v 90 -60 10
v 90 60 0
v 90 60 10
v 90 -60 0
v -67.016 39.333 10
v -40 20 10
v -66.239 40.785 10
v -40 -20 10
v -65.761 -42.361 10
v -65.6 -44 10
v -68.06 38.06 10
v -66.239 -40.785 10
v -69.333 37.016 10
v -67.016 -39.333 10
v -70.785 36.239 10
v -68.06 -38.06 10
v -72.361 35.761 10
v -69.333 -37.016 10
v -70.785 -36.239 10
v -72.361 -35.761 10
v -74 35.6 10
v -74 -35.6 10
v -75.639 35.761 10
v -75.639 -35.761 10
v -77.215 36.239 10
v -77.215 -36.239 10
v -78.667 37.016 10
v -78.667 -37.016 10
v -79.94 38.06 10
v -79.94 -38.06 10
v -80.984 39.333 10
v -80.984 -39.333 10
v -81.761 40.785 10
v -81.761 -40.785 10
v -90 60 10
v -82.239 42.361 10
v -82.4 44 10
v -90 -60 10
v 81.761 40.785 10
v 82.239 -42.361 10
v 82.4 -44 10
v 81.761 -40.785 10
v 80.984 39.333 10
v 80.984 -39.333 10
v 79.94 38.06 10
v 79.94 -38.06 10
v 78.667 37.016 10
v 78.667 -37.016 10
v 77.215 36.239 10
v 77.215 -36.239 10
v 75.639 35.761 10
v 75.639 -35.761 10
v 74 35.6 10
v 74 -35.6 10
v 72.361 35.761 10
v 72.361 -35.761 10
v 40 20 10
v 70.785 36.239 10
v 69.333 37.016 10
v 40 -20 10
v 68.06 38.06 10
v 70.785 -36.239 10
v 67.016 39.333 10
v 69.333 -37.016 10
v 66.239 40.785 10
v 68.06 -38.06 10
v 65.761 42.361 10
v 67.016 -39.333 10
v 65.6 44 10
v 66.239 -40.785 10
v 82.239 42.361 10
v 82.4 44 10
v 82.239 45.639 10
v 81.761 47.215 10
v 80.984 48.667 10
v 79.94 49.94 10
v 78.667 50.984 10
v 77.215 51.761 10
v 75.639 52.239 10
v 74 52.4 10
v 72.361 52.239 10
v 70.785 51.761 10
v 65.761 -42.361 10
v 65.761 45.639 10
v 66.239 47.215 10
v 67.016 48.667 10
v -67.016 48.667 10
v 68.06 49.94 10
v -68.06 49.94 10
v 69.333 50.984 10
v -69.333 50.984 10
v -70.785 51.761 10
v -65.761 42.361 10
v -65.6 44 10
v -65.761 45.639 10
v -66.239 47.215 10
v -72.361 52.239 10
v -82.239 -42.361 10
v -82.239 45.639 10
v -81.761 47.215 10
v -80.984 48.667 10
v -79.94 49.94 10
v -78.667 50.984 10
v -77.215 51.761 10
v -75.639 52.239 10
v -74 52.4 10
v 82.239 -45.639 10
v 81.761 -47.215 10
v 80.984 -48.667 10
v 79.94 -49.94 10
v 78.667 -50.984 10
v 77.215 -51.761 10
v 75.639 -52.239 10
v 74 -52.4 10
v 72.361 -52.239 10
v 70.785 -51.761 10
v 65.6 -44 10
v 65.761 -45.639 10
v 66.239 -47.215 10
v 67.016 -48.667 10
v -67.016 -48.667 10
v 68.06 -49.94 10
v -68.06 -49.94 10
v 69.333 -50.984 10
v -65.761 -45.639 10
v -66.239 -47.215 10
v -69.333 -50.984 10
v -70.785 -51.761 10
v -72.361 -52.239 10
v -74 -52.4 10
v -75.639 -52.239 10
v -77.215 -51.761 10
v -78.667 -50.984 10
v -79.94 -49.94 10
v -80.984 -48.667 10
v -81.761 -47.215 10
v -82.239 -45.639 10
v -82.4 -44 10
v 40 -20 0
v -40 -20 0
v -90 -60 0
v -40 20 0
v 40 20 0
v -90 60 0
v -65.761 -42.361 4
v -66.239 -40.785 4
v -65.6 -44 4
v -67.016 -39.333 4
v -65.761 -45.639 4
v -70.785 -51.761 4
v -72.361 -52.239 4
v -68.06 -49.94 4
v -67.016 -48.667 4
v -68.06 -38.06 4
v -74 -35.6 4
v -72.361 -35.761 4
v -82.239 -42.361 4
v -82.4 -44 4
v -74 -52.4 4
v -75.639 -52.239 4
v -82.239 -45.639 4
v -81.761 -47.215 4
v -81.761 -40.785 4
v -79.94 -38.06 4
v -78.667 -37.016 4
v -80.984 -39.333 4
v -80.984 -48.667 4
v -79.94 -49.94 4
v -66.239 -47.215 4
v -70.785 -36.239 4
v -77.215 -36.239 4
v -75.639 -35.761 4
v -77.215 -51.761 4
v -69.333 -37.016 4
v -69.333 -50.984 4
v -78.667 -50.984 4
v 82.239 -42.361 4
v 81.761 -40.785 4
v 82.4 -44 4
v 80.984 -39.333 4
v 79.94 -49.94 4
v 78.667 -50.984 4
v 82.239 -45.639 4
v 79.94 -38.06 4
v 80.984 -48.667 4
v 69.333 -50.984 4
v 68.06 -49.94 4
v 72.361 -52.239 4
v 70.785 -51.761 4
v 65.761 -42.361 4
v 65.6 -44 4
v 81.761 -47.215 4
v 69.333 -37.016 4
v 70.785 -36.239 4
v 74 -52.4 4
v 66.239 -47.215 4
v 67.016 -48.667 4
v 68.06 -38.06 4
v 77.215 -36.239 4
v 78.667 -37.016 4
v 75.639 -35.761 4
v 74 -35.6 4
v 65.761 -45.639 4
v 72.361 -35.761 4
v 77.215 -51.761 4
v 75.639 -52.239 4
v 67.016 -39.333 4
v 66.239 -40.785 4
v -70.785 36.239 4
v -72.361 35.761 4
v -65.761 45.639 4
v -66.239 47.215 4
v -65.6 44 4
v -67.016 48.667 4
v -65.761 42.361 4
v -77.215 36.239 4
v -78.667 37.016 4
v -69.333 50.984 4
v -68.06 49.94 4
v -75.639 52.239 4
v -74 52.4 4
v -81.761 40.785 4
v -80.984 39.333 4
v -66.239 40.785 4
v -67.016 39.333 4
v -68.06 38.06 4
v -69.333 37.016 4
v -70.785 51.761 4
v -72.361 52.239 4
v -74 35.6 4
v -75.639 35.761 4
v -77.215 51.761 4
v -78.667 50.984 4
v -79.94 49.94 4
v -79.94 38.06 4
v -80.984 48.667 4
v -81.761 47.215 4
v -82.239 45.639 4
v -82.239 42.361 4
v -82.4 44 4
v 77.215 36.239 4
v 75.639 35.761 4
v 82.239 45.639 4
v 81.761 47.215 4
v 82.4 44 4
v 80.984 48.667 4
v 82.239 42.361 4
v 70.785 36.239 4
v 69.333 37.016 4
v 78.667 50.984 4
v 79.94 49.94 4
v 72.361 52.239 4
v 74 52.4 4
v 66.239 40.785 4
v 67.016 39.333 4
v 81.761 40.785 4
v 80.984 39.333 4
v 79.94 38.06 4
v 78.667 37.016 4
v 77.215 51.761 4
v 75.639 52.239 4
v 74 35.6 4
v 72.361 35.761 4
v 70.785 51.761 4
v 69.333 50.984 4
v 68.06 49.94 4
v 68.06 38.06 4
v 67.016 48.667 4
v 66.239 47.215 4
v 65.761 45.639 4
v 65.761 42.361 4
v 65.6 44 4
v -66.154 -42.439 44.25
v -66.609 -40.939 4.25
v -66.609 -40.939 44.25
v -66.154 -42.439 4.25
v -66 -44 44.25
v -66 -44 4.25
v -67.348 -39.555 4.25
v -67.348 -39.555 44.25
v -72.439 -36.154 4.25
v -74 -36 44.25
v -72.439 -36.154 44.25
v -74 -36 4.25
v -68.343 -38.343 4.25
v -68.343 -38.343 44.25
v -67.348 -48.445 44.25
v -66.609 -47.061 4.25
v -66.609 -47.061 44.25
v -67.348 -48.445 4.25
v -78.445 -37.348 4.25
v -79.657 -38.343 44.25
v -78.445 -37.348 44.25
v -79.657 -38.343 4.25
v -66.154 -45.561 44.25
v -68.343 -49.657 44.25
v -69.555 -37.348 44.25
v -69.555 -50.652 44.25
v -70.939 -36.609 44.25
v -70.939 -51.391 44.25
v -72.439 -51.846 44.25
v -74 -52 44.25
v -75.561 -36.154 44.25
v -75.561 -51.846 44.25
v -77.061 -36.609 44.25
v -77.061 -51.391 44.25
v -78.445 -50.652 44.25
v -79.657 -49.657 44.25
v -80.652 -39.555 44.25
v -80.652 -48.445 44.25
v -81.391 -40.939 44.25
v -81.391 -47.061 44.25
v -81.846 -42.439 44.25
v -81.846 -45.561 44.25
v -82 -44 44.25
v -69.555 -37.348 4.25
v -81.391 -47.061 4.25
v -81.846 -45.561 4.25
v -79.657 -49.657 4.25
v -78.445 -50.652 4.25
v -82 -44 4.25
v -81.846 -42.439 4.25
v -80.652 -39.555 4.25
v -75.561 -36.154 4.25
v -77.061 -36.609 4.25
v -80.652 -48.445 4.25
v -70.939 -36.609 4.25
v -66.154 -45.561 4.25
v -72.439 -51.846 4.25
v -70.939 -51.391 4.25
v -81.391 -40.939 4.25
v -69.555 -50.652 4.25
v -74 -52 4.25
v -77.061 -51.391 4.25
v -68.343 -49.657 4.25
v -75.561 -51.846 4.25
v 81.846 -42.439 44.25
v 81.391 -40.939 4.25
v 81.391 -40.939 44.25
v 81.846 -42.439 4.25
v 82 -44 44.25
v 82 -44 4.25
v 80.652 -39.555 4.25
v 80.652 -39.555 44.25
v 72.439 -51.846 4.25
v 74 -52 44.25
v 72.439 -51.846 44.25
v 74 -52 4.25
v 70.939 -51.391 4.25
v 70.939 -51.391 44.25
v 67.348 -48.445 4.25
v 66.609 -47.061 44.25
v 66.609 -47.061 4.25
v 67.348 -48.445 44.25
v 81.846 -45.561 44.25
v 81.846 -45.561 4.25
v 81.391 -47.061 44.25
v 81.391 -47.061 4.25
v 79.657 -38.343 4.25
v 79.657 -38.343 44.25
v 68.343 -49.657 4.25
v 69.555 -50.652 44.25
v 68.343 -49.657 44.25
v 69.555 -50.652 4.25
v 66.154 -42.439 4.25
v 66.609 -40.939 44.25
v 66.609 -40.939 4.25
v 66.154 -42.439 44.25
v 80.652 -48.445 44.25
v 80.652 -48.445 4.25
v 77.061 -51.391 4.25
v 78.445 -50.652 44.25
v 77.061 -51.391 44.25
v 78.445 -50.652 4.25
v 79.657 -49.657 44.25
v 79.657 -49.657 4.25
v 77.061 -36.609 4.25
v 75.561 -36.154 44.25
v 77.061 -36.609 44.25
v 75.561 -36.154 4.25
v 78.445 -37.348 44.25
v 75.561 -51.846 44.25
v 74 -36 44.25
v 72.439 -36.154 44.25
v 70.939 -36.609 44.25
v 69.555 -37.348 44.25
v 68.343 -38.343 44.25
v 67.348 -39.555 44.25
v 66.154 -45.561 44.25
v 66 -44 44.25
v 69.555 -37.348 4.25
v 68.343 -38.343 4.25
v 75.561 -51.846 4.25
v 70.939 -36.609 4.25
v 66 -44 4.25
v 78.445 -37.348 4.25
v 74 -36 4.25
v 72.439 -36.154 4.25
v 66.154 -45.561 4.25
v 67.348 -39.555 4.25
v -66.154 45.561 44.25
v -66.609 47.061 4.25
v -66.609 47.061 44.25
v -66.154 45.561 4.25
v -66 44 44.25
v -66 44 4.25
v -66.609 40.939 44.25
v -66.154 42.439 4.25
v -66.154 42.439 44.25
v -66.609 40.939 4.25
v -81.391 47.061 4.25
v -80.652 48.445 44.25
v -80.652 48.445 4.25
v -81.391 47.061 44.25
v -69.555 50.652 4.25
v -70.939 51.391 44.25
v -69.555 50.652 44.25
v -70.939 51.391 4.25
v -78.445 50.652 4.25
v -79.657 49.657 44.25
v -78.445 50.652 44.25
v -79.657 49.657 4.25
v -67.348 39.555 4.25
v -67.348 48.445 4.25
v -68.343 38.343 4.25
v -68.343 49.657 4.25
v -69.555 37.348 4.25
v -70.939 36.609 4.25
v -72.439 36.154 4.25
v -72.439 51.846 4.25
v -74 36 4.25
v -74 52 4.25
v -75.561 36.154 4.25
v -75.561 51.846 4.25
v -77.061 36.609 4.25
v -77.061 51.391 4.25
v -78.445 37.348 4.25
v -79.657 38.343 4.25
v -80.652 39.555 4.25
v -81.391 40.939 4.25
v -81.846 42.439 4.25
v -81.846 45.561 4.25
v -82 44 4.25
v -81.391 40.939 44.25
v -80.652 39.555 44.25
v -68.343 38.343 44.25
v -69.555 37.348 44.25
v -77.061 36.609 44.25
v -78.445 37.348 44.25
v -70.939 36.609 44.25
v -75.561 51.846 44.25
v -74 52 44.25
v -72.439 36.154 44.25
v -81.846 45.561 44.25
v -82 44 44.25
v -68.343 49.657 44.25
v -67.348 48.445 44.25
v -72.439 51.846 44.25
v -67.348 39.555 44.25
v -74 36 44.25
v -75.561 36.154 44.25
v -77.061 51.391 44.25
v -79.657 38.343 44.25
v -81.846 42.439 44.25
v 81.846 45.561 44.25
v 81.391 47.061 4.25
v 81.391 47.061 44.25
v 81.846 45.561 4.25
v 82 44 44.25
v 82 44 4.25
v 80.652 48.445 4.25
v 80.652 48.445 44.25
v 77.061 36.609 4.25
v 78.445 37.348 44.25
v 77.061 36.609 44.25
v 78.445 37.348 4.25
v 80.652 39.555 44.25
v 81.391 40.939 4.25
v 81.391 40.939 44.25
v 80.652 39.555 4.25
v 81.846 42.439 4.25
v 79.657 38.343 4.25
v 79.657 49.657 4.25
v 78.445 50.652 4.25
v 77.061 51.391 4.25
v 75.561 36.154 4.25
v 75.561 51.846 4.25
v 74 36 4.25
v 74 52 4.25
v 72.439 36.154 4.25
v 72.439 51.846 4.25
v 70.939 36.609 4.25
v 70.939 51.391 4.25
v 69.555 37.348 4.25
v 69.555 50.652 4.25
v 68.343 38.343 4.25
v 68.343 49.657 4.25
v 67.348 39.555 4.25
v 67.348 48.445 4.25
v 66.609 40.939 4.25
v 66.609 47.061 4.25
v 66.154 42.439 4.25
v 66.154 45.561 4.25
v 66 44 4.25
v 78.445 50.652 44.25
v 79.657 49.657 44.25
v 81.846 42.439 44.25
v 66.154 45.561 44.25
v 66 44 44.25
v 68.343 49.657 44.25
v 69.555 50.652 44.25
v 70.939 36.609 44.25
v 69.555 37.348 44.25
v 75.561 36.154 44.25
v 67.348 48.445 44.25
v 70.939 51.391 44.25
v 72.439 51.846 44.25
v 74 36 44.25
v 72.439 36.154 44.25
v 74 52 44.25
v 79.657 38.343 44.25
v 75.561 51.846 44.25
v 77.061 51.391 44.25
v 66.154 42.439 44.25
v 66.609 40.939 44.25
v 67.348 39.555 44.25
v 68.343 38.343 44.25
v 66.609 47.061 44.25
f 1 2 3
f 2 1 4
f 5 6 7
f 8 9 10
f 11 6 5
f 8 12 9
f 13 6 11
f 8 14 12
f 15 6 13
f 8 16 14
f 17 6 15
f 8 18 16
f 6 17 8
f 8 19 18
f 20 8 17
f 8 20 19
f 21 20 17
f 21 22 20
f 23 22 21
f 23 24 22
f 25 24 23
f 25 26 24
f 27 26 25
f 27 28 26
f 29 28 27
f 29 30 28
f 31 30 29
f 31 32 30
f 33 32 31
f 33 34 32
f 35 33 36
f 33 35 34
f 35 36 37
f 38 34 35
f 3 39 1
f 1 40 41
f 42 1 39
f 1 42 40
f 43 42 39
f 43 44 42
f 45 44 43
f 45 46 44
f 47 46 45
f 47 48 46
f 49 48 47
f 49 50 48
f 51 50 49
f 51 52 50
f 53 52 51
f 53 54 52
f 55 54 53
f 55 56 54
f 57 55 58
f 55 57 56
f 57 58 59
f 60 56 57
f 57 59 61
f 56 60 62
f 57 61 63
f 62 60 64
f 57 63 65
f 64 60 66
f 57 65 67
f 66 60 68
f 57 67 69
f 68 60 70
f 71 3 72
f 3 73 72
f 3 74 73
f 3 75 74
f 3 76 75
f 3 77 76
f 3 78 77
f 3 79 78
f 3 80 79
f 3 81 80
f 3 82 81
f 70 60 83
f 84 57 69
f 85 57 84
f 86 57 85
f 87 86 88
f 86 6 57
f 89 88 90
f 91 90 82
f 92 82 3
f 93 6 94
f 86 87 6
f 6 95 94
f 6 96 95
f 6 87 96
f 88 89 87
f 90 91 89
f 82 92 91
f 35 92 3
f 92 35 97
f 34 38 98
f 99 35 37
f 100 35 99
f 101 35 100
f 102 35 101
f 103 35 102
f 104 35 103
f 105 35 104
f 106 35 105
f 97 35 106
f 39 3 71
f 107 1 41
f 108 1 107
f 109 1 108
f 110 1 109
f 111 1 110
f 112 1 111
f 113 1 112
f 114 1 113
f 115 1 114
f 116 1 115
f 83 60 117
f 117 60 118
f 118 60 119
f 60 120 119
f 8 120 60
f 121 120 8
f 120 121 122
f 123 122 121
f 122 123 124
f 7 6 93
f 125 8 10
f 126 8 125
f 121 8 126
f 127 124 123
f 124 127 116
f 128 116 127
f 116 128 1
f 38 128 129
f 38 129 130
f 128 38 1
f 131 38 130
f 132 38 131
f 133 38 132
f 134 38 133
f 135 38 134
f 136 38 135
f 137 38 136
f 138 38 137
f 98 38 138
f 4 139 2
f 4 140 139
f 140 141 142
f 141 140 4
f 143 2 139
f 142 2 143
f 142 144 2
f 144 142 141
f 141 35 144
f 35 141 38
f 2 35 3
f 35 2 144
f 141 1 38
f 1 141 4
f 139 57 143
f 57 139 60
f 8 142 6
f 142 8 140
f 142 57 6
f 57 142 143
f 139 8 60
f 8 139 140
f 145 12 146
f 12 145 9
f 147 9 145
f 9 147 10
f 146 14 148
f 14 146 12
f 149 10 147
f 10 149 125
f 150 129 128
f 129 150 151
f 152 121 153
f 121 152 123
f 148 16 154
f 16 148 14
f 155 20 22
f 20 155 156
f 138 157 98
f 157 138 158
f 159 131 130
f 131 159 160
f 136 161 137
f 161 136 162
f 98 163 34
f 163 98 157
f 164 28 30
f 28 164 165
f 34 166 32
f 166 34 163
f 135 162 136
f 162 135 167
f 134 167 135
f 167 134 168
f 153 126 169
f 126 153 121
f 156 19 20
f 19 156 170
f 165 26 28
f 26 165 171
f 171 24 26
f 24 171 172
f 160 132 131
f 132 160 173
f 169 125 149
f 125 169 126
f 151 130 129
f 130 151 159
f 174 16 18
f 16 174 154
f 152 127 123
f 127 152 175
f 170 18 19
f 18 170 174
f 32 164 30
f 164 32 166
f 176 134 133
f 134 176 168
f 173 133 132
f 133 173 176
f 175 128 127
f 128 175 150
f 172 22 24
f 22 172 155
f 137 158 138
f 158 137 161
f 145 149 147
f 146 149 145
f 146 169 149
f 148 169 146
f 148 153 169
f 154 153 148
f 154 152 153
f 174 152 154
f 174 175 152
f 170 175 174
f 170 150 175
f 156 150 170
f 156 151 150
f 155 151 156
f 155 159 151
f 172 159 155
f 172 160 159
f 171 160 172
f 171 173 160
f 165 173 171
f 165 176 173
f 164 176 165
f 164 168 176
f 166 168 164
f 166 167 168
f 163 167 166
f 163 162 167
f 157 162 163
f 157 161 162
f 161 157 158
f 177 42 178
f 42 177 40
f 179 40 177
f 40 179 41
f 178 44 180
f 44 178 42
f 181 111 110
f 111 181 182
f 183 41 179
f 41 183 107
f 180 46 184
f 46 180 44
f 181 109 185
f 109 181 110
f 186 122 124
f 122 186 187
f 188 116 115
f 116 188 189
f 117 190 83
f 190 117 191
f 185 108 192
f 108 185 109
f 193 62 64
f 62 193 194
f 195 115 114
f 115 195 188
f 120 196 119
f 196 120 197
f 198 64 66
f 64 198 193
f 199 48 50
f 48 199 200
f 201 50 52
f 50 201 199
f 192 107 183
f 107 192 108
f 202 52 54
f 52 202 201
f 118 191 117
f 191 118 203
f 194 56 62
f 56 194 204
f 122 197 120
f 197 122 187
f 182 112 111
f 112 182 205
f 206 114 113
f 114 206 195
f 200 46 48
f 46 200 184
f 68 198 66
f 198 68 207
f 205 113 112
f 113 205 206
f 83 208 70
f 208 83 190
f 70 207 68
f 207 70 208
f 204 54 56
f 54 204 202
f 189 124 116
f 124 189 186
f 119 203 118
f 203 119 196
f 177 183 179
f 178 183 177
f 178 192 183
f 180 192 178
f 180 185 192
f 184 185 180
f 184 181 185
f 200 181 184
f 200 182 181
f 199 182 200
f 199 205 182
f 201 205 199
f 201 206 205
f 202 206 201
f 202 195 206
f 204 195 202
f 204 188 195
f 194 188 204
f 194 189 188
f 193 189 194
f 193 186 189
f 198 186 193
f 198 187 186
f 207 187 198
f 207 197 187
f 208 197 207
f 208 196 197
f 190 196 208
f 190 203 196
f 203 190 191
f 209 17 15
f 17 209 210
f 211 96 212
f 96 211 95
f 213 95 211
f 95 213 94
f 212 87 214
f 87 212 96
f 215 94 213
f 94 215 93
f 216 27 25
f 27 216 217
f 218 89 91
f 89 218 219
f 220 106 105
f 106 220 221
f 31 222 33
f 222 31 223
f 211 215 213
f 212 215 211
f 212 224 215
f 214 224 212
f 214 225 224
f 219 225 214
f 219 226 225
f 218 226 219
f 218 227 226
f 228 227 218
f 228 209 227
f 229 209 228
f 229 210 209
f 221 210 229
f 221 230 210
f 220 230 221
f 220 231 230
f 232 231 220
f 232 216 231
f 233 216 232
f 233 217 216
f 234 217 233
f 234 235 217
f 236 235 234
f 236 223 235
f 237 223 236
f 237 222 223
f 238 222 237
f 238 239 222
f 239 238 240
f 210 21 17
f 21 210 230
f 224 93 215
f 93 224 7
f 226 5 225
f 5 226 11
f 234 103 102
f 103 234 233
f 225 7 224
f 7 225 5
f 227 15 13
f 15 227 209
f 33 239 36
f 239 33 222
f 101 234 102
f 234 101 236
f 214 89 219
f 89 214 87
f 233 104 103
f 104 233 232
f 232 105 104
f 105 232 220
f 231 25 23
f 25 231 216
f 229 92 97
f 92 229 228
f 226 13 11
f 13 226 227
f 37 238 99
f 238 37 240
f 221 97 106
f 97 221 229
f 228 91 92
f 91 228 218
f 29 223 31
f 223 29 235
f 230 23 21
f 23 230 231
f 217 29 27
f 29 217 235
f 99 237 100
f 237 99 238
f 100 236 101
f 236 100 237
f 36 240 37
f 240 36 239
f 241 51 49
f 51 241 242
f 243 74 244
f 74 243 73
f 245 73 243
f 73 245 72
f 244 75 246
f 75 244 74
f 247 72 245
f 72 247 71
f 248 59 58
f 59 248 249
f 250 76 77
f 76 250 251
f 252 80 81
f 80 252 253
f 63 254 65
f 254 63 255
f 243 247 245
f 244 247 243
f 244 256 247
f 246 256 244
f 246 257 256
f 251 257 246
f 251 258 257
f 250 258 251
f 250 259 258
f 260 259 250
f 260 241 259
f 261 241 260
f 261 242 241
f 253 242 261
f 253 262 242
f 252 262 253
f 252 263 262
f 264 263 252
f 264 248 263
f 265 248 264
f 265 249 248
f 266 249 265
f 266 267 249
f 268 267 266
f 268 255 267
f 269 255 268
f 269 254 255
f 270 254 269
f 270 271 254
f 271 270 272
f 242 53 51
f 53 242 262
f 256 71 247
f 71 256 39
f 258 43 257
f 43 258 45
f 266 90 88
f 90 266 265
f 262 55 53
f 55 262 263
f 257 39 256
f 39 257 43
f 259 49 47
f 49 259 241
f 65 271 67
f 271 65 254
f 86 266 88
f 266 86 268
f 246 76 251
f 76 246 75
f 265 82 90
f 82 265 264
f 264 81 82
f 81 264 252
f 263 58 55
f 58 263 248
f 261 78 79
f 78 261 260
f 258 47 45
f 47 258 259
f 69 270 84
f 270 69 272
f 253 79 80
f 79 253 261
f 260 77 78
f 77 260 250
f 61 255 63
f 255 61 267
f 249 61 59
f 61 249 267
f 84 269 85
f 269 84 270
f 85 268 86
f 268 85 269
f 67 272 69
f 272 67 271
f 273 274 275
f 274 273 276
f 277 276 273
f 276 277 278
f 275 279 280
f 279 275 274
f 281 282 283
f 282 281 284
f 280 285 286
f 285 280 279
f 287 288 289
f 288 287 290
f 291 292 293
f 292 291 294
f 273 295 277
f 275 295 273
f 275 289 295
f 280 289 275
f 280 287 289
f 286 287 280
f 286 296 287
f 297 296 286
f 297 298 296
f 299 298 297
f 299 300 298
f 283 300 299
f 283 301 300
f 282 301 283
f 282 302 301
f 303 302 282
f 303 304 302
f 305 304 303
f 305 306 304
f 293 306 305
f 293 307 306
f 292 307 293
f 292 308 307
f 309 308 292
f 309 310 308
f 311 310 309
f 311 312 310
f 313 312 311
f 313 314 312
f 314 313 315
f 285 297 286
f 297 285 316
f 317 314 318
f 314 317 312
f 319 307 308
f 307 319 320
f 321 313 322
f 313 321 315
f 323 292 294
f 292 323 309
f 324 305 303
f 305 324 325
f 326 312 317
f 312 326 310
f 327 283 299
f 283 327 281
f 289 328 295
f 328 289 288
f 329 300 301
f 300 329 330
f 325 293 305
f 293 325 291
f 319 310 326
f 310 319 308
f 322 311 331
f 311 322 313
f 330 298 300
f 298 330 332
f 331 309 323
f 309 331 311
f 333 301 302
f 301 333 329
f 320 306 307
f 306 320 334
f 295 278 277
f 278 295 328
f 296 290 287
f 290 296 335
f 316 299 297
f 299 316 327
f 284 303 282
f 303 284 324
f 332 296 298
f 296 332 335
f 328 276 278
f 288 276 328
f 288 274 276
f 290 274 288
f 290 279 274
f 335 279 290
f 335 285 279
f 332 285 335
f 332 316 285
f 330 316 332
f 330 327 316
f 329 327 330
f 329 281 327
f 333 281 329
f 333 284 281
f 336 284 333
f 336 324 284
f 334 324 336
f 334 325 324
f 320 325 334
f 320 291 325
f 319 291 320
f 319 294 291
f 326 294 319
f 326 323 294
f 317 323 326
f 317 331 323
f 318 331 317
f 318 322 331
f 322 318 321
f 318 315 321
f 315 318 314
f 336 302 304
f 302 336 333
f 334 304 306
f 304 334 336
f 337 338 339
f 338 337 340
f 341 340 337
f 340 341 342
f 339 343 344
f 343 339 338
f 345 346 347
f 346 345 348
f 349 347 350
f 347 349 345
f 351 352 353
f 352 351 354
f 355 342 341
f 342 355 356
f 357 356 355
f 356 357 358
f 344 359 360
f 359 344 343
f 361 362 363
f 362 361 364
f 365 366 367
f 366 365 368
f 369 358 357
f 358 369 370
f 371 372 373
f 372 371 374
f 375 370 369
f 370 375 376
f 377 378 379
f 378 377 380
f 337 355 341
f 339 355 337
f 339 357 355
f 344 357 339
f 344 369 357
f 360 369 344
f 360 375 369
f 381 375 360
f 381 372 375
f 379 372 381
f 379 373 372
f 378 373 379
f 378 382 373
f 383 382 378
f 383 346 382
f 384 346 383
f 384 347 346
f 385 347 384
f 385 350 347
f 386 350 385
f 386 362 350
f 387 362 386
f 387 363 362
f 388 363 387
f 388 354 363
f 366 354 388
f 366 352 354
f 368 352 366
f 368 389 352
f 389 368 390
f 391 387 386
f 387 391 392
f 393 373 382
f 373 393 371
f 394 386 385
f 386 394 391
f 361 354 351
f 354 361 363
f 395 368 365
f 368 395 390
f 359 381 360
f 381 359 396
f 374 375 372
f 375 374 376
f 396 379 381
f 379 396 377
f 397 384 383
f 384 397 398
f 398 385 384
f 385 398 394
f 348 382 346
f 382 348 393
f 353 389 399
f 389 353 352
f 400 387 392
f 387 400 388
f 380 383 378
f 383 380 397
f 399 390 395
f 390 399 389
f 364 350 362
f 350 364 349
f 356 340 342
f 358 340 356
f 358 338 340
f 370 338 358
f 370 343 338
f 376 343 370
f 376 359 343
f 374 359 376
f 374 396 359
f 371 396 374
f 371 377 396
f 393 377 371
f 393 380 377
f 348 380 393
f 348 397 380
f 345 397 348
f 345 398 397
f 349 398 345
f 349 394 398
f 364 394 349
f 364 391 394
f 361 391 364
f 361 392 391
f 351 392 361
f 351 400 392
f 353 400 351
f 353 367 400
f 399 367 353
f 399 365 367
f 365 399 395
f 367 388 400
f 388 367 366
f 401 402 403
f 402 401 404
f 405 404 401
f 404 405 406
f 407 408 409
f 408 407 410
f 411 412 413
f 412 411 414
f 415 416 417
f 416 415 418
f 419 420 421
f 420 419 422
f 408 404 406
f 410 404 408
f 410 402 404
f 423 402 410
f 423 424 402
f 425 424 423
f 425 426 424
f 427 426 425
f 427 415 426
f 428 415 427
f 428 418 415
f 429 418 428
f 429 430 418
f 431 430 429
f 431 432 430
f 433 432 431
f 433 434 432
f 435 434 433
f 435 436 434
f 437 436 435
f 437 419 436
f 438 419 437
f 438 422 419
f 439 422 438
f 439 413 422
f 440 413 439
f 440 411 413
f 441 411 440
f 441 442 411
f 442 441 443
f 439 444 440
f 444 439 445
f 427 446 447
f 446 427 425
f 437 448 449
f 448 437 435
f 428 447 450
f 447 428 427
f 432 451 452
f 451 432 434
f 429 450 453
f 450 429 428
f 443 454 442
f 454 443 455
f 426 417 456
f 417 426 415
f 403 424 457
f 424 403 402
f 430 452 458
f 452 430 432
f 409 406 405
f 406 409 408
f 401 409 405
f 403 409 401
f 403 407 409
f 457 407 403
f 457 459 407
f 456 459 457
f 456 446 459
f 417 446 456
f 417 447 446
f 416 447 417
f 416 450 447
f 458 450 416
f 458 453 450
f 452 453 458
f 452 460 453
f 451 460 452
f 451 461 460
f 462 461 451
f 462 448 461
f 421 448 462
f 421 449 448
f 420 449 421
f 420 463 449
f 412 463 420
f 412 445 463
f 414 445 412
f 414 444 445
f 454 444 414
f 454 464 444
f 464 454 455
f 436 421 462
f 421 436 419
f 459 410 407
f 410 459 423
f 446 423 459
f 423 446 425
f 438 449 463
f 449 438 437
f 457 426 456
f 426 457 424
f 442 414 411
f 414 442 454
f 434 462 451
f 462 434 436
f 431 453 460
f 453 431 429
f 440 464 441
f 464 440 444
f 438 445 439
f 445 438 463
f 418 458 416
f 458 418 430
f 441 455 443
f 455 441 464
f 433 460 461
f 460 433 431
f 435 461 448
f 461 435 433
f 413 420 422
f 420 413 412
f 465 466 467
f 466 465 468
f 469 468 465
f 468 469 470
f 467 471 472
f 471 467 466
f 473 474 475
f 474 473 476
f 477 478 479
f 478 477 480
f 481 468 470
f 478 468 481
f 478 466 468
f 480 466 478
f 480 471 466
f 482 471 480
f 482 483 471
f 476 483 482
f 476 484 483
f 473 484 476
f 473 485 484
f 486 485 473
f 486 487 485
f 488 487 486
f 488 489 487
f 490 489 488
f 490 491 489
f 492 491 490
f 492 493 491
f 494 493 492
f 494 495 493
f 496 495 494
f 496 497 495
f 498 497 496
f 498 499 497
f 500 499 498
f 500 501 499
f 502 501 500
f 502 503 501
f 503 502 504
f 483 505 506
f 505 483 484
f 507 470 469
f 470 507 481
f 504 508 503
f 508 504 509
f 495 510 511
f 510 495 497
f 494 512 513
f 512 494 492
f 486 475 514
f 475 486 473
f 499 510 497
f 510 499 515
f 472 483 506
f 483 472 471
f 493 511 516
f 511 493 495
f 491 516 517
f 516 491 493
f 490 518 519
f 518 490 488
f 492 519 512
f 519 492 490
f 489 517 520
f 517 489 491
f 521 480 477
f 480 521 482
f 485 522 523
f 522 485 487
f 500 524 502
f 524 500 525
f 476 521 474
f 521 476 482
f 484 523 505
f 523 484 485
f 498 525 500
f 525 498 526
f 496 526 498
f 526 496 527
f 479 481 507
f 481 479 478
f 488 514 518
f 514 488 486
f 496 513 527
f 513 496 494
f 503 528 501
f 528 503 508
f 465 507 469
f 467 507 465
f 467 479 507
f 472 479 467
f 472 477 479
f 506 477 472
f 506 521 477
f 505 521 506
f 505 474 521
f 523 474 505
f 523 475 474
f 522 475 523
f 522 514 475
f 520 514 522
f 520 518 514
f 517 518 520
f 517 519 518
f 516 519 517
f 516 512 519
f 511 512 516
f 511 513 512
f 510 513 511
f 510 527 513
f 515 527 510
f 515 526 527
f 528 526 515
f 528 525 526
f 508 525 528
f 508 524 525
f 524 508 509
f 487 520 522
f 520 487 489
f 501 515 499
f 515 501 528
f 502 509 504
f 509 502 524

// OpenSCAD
$fn = 32;

// ------------------------------------------------------------------------
// Frame with four posts: 180 x 120 mm frame, four d16 posts
// Every part is its own module, assembly() places them once.
// ------------------------------------------------------------------------

// --- part 1 ---
module base_frame() {
  difference() {
    translate([-90, -60, 0]) cube([180, 120, 10]);
    translate([-40, -20, -1]) cube([80, 40, 12]);
    translate([-74, -44, 4]) cylinder(h = 7, d = 16.8);
    translate([74, -44, 4]) cylinder(h = 7, d = 16.8);
    translate([-74, 44, 4]) cylinder(h = 7, d = 16.8);
    translate([74, 44, 4]) cylinder(h = 7, d = 16.8);
  }
}

// --- part 2 ---
module post1() {
  cylinder(h = 40, d = 16);
}

// --- part 3 ---
module post2() {
  cylinder(h = 40, d = 16);
}

// --- part 4 ---
module post3() {
  cylinder(h = 40, d = 16);
}

// --- part 5 ---
module post4() {
  cylinder(h = 40, d = 16);
}

// --- assembly ---
module assembly() {
  translate([0, 0, 0]) rotate([0, 0, 0]) base_frame();
  translate([-74, -44, 4.25]) rotate([0, 0, 0]) post1();
  translate([74, -44, 4.25]) rotate([0, 0, 0]) post2();
  translate([-74, 44, 4.25]) rotate([0, 0, 0]) post3();
  translate([74, 44, 4.25]) rotate([0, 0, 0]) post4();
}

assembly();
